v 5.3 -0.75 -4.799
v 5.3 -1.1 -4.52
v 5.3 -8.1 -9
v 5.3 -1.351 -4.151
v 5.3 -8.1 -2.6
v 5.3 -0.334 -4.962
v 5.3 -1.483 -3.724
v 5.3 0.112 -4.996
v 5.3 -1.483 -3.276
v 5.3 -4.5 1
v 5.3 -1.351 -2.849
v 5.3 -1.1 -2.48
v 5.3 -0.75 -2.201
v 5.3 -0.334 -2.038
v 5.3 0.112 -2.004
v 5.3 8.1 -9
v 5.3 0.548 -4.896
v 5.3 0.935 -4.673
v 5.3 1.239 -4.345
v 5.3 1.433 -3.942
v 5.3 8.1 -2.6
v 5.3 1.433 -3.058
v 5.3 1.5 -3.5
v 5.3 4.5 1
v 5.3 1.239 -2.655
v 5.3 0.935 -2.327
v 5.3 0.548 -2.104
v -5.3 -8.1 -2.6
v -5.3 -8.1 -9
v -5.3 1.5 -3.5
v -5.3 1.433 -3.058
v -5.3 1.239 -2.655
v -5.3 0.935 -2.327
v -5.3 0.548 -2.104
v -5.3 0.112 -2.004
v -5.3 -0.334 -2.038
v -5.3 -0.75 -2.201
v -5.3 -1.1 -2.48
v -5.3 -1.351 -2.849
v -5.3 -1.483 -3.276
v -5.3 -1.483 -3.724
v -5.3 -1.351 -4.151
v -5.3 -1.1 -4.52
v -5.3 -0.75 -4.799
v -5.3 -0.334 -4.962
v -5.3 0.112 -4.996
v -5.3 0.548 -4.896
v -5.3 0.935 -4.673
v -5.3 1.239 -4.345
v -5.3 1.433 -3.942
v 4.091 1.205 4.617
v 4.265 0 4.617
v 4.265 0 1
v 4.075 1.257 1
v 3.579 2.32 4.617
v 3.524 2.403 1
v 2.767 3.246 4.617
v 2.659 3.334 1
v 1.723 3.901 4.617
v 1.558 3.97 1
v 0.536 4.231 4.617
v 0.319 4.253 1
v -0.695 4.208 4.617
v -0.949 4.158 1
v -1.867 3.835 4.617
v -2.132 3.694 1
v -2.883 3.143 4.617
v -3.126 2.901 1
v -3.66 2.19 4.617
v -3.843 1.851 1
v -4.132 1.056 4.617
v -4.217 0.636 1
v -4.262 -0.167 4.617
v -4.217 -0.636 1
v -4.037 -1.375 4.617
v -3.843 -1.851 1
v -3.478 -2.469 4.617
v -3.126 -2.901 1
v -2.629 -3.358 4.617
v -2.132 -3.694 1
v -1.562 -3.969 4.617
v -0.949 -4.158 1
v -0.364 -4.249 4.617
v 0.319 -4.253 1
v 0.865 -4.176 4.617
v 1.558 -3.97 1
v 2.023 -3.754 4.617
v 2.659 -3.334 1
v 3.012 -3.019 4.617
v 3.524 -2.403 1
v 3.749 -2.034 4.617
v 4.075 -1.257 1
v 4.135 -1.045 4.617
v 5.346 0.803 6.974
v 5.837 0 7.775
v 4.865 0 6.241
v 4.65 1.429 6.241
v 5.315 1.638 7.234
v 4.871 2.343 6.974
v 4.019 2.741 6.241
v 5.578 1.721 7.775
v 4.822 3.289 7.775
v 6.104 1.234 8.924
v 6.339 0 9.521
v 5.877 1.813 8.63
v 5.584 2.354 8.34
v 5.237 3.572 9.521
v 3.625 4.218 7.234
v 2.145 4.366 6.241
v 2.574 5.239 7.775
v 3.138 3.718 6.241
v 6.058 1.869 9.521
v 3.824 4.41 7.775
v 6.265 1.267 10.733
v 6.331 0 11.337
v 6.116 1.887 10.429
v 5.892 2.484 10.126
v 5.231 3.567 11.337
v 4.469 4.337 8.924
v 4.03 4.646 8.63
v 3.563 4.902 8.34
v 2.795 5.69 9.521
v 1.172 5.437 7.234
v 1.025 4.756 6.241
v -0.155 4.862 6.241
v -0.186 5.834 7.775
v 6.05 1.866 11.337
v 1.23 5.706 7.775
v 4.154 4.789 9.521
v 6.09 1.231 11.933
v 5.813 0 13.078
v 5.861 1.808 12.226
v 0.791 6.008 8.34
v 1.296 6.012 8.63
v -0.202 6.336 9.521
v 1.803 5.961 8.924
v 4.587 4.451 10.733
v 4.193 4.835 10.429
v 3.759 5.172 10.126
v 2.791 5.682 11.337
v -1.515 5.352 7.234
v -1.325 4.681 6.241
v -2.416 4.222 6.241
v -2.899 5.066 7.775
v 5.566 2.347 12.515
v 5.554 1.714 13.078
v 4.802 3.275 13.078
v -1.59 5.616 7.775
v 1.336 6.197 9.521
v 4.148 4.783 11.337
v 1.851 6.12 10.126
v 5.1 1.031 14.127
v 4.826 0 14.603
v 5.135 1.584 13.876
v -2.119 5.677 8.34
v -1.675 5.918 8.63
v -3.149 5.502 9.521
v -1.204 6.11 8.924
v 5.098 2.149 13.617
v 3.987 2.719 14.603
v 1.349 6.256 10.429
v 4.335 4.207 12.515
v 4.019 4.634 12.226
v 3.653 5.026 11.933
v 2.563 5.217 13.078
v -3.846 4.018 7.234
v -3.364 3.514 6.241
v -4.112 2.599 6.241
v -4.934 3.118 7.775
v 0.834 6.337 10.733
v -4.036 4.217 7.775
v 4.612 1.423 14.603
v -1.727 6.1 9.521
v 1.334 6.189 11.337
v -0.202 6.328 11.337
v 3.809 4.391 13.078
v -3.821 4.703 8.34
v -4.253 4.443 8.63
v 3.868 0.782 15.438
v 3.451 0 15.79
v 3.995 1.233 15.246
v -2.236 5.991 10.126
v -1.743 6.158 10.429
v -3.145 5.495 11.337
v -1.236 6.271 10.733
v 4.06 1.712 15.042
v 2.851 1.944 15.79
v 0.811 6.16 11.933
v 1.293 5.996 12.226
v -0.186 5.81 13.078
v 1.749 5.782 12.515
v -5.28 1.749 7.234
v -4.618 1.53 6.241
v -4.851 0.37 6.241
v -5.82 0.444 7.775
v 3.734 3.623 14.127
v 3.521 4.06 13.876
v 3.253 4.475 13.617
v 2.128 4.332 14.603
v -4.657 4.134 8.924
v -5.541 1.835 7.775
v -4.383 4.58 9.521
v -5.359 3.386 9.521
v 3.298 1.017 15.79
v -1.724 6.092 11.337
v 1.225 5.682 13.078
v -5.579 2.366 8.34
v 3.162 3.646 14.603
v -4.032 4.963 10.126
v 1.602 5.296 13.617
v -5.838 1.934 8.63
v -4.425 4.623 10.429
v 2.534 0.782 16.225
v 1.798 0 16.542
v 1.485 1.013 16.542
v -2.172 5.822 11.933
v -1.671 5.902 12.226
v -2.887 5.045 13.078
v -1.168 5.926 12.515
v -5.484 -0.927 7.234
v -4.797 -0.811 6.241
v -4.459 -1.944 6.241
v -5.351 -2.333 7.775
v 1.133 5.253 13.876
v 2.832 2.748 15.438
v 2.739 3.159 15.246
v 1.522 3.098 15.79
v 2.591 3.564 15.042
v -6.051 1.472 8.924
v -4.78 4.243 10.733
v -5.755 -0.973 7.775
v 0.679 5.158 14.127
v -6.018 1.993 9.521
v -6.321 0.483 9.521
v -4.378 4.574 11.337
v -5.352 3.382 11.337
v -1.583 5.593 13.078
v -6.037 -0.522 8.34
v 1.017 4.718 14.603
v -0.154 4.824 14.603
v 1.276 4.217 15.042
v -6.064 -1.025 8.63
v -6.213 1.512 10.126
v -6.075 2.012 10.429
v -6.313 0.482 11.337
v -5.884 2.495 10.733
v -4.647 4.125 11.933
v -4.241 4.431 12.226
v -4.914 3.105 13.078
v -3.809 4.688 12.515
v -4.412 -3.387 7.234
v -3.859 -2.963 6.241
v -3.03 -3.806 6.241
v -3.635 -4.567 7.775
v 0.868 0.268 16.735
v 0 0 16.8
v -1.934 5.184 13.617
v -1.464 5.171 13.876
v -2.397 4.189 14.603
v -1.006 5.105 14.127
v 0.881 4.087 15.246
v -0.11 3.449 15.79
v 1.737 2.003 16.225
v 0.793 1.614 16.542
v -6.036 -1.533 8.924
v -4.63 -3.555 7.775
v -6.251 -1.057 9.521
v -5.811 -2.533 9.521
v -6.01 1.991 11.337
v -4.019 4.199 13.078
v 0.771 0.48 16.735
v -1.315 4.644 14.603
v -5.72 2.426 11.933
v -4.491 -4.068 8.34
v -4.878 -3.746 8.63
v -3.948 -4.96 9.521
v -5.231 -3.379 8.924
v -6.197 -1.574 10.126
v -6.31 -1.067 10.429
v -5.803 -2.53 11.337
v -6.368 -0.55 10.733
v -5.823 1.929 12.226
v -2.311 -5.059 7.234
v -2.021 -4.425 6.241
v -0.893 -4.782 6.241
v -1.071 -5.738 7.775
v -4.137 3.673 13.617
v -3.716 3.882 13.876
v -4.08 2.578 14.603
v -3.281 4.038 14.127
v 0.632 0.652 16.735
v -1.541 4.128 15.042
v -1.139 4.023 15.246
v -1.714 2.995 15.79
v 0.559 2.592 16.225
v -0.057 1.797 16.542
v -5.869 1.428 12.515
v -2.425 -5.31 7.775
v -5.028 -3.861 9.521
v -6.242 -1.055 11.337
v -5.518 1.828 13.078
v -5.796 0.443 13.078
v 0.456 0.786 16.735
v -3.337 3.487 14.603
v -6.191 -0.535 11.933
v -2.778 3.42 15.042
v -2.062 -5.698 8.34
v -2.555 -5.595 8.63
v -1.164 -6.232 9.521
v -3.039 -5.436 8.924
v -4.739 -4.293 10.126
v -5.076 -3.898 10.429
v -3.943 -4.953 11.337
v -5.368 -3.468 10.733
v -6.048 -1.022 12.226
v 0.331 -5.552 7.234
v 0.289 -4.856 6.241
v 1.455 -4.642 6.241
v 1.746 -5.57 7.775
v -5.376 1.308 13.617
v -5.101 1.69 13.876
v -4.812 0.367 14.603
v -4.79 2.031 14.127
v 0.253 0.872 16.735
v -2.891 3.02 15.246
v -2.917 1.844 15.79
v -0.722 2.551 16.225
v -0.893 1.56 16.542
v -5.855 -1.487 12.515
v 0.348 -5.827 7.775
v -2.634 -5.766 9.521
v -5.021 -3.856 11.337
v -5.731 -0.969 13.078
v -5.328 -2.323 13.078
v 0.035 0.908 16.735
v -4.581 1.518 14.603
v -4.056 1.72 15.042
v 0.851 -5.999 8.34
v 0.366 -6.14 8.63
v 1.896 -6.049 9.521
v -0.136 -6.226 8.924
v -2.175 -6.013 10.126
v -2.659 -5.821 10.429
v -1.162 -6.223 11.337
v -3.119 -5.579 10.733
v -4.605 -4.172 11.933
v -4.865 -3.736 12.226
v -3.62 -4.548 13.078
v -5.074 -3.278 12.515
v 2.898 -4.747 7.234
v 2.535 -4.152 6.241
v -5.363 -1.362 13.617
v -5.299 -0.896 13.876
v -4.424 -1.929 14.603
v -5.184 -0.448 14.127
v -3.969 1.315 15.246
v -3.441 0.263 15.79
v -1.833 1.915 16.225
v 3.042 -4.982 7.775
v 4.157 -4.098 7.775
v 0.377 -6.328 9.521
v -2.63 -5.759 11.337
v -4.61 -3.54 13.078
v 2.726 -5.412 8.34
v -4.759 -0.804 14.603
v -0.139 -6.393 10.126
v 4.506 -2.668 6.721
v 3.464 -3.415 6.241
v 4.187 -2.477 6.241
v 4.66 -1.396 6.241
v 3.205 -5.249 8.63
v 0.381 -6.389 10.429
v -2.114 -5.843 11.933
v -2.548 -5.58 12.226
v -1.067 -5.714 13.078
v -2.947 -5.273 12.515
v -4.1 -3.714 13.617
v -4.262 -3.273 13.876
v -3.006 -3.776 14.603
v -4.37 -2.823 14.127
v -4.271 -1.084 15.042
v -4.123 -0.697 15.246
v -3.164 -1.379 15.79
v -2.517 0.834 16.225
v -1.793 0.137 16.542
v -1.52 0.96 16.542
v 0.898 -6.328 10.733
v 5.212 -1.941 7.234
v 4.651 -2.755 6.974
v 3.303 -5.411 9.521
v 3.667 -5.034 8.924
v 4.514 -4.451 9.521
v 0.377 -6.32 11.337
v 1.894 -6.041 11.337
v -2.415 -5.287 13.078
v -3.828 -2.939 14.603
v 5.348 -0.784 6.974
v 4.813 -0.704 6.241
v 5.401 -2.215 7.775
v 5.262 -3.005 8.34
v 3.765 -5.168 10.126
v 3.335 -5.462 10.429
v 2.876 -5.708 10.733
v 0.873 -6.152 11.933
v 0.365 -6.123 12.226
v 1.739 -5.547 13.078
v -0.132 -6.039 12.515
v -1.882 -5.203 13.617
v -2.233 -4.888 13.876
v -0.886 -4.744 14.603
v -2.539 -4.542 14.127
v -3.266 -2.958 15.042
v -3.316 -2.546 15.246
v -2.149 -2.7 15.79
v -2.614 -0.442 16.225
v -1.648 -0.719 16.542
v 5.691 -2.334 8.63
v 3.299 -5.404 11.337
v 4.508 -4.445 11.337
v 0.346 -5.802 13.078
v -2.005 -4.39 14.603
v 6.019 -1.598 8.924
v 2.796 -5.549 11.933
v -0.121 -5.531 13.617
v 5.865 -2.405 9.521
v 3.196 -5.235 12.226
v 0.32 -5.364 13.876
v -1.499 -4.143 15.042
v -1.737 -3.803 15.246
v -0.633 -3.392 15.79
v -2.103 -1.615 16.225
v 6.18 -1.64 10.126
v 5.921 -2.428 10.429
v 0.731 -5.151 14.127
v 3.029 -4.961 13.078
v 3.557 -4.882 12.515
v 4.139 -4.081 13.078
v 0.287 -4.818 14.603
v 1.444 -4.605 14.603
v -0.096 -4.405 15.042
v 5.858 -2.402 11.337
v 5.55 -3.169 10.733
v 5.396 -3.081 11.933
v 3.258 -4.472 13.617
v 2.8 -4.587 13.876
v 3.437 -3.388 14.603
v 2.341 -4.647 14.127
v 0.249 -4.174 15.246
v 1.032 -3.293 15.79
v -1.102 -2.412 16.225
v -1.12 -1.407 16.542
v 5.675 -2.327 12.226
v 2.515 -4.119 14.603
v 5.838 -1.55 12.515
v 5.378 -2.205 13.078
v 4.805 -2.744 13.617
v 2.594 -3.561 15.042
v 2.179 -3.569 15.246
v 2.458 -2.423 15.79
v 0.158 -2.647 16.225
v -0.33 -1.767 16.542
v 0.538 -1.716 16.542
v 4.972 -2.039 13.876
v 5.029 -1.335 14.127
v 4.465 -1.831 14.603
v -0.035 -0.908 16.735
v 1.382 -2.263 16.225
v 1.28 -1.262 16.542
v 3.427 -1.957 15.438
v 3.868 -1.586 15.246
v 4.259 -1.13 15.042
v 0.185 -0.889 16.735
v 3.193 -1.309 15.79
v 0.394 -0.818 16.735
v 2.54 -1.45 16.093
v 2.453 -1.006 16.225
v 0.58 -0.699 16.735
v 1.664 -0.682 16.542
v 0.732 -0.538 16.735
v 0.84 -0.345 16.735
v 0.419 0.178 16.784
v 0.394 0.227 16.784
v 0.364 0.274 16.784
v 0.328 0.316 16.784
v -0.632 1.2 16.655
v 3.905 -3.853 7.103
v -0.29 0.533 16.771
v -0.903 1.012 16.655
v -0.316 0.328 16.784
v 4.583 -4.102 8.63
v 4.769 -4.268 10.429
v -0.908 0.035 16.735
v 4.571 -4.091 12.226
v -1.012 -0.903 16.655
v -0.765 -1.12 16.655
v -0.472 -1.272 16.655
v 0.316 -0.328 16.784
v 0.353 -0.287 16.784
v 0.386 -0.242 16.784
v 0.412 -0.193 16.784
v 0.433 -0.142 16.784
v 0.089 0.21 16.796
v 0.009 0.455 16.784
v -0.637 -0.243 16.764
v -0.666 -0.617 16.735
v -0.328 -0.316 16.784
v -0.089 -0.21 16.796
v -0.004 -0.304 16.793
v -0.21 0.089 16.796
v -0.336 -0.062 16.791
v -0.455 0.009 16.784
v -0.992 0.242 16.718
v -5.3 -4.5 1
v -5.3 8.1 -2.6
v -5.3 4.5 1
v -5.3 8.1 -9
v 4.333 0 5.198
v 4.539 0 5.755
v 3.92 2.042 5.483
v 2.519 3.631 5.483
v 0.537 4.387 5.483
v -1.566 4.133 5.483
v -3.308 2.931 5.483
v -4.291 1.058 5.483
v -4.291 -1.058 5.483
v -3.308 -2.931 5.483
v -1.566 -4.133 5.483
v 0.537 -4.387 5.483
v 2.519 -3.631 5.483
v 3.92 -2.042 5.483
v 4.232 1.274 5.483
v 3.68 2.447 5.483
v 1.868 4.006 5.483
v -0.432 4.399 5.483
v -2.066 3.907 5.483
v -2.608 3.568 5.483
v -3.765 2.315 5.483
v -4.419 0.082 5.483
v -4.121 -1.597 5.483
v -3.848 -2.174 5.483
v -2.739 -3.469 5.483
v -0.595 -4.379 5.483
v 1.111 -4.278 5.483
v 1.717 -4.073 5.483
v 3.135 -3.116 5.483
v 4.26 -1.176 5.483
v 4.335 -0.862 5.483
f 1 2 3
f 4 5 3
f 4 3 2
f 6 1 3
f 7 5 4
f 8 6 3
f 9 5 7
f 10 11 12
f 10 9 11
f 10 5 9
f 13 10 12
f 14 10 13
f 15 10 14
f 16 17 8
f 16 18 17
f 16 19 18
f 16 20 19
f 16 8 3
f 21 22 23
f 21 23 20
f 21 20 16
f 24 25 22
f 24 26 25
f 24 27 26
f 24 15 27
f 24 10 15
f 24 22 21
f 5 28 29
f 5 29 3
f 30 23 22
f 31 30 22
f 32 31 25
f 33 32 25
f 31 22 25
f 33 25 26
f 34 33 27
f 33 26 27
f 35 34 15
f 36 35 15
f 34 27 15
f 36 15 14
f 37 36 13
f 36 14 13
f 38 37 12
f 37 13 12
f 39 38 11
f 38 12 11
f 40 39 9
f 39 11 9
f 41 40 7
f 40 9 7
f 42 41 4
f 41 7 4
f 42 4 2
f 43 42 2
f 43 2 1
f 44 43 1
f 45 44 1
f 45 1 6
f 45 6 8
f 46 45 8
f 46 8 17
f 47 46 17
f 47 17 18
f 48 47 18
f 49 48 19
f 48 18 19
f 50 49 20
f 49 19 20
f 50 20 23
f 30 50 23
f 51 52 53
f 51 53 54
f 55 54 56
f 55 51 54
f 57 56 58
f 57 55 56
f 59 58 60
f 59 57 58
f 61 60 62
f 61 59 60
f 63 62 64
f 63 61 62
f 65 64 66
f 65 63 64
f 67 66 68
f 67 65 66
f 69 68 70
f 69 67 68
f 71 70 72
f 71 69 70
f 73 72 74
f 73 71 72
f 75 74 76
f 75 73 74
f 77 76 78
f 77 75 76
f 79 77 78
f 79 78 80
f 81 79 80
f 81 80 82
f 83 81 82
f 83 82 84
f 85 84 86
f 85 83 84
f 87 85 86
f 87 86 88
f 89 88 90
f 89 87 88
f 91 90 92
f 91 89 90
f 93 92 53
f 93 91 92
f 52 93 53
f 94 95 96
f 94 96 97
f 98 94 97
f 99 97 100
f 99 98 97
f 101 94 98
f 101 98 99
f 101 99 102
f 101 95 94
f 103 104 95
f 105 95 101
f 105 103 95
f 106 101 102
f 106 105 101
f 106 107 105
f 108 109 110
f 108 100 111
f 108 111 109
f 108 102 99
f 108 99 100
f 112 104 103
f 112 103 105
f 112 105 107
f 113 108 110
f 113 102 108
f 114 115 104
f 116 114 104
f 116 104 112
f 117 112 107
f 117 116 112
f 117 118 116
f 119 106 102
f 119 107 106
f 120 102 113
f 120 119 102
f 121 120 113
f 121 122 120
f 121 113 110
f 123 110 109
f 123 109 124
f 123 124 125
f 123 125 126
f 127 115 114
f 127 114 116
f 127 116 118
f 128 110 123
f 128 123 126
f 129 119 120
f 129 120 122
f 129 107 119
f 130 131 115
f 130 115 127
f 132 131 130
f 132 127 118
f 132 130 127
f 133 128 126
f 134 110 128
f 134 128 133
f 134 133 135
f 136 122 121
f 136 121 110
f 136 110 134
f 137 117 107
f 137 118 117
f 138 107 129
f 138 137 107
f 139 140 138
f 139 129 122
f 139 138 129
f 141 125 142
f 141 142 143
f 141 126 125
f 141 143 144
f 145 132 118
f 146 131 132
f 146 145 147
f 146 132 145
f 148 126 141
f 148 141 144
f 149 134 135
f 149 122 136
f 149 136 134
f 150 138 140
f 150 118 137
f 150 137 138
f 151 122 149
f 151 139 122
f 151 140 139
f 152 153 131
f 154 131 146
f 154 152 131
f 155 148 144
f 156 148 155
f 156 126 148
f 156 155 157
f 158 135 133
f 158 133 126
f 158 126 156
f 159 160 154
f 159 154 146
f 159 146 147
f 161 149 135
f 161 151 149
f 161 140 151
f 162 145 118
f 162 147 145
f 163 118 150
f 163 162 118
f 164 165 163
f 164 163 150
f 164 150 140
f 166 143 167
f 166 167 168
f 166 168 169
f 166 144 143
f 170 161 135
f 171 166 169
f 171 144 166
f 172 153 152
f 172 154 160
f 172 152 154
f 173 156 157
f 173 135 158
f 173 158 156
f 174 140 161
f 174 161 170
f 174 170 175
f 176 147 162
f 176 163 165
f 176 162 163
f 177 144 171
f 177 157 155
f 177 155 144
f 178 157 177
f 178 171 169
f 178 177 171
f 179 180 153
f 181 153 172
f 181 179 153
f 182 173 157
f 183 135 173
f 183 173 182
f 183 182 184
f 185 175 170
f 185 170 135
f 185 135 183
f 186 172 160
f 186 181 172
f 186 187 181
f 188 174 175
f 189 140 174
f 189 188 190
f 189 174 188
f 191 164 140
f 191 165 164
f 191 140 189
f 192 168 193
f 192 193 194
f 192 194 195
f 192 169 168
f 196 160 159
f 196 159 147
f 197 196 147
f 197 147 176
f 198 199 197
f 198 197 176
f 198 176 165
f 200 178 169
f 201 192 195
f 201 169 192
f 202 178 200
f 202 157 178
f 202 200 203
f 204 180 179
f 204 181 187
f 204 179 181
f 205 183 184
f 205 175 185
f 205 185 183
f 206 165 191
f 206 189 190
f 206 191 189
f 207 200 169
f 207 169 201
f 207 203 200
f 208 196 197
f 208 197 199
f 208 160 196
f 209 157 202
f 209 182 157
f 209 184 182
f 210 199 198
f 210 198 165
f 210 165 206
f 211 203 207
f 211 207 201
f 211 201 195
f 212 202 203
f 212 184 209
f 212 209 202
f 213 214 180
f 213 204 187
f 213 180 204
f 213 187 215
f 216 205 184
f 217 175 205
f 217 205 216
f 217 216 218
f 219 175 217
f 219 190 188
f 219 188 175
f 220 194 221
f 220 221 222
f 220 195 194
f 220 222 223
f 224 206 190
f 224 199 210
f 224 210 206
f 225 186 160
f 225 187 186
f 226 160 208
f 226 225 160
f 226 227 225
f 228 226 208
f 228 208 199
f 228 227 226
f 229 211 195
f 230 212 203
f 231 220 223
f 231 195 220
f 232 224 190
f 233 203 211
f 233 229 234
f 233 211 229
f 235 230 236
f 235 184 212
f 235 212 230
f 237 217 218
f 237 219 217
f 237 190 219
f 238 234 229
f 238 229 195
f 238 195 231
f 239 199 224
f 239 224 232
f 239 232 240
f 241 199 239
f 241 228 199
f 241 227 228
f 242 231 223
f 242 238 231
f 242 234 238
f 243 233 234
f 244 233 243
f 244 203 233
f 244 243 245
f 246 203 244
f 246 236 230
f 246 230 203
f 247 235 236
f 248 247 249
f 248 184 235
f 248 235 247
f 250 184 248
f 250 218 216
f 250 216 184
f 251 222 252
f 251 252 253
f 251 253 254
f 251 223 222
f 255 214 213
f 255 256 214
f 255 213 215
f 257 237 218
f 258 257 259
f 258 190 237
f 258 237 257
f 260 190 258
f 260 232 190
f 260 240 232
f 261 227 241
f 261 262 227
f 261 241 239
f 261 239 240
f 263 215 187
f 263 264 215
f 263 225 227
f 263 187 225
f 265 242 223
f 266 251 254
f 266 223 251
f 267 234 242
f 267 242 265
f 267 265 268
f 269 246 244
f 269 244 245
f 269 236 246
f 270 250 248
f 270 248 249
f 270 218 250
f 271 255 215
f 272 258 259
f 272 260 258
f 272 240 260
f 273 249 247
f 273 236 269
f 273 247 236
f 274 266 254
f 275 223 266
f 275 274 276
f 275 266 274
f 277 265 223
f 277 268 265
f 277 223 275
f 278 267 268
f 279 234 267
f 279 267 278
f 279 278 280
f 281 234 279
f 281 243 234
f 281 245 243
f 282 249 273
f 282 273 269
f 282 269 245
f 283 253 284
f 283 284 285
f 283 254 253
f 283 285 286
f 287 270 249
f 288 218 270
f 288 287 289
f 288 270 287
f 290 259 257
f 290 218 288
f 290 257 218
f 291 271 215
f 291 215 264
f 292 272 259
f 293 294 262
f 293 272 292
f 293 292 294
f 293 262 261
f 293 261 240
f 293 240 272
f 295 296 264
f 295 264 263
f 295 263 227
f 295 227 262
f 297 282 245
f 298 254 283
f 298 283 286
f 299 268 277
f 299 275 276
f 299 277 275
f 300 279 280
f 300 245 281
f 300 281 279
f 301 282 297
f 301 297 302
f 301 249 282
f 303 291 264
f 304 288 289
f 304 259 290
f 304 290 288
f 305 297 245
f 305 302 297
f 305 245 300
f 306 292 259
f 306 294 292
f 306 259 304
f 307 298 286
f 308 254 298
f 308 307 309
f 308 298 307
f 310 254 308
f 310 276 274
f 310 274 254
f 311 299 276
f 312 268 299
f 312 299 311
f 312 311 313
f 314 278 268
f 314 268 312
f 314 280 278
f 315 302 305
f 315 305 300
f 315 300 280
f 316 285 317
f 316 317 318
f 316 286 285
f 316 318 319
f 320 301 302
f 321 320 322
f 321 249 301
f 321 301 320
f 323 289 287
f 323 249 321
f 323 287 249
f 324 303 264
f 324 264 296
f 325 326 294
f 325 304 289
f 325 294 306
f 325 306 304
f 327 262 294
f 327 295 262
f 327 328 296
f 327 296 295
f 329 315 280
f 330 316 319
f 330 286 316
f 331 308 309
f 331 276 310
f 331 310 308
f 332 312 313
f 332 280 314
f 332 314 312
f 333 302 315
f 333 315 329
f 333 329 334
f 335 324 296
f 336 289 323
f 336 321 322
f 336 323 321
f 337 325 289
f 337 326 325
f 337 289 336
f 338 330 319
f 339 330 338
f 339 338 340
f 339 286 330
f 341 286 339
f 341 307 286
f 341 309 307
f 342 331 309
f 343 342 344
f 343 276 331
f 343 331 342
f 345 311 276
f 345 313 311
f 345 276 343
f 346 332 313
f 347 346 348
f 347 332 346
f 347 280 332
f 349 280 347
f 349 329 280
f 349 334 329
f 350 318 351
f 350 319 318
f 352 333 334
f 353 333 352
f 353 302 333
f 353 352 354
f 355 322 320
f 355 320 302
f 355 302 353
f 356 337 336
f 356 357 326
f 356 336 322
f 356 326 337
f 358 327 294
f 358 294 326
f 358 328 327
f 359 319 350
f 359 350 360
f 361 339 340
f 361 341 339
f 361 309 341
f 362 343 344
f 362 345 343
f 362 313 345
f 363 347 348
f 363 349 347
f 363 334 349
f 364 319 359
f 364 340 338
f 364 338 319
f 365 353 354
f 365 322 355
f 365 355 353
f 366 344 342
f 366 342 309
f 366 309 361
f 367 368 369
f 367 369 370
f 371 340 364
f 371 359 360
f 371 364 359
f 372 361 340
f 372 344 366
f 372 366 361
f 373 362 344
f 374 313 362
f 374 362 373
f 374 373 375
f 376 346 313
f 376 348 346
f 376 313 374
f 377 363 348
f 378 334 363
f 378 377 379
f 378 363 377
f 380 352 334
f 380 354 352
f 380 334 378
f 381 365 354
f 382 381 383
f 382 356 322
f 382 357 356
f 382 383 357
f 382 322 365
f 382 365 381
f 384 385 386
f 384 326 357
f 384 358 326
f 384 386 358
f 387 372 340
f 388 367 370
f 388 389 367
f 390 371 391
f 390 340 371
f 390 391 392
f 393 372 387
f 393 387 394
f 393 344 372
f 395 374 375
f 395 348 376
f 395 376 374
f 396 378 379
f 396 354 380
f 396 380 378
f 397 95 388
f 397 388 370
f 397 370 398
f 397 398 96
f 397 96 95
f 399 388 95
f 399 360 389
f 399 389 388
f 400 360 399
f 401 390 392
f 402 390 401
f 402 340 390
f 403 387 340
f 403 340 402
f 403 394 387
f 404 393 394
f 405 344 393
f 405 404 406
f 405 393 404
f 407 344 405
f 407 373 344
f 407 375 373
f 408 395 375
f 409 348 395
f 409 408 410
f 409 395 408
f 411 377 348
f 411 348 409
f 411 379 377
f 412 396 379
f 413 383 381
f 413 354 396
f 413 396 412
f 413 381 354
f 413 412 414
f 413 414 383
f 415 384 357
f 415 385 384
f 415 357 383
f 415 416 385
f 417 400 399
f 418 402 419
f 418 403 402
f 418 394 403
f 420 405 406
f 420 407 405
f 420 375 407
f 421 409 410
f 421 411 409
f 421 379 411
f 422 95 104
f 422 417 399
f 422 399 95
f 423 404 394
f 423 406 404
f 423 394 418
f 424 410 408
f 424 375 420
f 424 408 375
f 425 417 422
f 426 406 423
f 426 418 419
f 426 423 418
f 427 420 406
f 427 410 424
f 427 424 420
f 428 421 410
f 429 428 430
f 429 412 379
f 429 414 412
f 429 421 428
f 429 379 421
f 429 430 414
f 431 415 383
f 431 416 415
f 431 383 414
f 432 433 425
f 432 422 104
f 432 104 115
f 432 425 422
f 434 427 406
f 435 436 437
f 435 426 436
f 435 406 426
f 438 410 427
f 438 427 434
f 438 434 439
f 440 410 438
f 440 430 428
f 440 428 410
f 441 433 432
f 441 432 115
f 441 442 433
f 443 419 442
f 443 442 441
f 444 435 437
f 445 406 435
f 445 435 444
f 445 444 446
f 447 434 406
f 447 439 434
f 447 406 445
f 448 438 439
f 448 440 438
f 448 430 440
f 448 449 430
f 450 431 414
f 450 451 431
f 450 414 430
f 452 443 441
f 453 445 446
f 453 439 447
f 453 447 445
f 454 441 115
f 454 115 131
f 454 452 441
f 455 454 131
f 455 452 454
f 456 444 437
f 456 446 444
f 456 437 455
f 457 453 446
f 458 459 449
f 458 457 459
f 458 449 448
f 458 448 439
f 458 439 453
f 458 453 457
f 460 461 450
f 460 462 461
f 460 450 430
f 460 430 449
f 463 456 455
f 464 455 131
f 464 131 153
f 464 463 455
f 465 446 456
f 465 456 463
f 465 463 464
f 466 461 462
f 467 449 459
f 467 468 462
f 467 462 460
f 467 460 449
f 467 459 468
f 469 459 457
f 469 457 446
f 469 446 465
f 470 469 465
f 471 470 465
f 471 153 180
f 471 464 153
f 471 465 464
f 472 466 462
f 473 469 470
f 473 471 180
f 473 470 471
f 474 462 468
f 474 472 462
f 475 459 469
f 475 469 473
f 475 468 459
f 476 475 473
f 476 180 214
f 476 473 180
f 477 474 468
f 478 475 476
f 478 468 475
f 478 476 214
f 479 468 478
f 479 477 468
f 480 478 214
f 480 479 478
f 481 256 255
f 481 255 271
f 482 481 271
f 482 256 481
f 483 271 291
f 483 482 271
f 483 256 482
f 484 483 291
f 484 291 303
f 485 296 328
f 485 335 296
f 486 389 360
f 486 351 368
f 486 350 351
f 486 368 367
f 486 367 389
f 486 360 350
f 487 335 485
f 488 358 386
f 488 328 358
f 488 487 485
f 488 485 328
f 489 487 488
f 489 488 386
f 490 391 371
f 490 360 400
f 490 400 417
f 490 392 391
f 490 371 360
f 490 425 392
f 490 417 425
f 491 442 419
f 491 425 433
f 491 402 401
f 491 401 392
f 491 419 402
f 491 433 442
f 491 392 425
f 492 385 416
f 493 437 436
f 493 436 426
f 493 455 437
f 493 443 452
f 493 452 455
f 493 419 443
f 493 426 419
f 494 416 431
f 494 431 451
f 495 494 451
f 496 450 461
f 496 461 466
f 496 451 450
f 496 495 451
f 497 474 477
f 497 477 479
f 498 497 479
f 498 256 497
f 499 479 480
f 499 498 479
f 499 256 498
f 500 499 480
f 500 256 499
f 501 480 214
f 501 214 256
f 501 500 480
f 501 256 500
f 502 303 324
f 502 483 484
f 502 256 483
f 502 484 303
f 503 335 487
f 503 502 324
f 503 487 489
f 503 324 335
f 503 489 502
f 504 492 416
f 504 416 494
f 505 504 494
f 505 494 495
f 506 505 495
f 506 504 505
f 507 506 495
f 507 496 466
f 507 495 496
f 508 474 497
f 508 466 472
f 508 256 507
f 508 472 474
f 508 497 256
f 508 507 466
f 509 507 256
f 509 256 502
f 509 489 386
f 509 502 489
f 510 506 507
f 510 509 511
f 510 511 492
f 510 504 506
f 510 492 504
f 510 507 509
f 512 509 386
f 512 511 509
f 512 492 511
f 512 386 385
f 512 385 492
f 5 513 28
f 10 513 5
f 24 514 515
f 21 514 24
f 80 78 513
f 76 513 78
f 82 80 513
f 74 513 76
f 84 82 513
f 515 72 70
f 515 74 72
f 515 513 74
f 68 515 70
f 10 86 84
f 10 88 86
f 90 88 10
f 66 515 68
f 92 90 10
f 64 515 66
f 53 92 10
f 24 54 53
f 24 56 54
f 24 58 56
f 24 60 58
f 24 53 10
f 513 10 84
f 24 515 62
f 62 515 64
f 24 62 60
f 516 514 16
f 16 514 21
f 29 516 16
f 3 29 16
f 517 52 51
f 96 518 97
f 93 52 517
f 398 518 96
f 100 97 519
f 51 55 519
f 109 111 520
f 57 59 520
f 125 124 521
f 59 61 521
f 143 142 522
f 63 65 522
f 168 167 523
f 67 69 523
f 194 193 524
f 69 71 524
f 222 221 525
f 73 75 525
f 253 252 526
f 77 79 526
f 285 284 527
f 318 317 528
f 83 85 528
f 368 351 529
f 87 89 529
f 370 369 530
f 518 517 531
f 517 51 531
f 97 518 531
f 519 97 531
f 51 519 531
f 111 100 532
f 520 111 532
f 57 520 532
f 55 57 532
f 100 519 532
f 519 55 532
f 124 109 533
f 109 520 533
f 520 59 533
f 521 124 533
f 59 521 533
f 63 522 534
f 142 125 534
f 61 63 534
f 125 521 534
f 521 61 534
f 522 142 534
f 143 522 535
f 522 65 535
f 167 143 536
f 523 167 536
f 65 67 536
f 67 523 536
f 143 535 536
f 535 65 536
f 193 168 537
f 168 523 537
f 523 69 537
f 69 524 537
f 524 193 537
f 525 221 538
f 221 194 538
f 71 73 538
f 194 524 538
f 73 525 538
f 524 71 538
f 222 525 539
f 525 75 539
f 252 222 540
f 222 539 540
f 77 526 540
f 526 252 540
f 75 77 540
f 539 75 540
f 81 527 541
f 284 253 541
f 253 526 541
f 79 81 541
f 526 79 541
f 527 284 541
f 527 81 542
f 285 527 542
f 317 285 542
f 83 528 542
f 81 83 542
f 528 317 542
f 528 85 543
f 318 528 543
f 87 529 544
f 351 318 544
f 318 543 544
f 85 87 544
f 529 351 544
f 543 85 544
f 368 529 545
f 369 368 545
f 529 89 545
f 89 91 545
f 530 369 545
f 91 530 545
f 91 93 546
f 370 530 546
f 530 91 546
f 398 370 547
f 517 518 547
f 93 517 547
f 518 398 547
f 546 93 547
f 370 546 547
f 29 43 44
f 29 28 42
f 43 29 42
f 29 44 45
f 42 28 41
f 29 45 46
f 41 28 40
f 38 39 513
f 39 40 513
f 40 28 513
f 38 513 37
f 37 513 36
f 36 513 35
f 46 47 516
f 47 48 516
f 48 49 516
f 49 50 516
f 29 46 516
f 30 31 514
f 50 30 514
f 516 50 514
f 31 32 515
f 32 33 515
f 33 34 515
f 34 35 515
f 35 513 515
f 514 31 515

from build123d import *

# Parameters (mm, degrees)
F2_W          = 10.6
F2_H          = 16.2
F3_DEPTH      = 1
F3_DEPTH_BACK = 9
F4_R          = 1.5
F5_DEPTH      = 10.6
F6_SIZE       = 3.6
F7_R          = 2.5


with BuildPart() as f1:
    # F0 (on Front) → F1 (revolve)
    with BuildSketch(Plane.XZ):
        with BuildLine():
            Line((4.264979, 0), (4.264979, 5.628212))
            ThreePointArc((4.264979, 5.628212), (5.979107, 12.682604), (0, 16.8))
            Line((0, 16.8), (0, 0))
            Line((0, 0), (4.264979, 0))
        make_face()
    revolve(axis=Axis((0, 0, 30.748535), (0, 0, 1)))

    # F2 (on Top) → F3 (join, two sides)
    with BuildSketch(Plane.XY) as f3_sk:
        Rectangle(F2_W, F2_H)
    extrude(amount=F3_DEPTH)
    extrude(f3_sk.sketch, amount=-F3_DEPTH_BACK)

    # F4 (on face) → F5 (cut, through all)
    with BuildSketch(Plane.YZ.offset(5.3)):
        with Locations((0, -3.5)):
            Circle(F4_R)
    extrude(amount=-F5_DEPTH, mode=Mode.SUBTRACT)

    # F6
    f6_edges = [f1.edges().sort_by_distance(p)[0] for p in [
        (0, 8.1, 1),
        (0, -8.1, 1),
    ]]
    chamfer(f6_edges, length=F6_SIZE)

    # F7
    f7_edges = [f1.edges().sort_by_distance(p)[0] for p in [
        (-4.264979, 0, 5.628212),
    ]]
    fillet(f7_edges, radius=F7_R)


solid = f1.part
